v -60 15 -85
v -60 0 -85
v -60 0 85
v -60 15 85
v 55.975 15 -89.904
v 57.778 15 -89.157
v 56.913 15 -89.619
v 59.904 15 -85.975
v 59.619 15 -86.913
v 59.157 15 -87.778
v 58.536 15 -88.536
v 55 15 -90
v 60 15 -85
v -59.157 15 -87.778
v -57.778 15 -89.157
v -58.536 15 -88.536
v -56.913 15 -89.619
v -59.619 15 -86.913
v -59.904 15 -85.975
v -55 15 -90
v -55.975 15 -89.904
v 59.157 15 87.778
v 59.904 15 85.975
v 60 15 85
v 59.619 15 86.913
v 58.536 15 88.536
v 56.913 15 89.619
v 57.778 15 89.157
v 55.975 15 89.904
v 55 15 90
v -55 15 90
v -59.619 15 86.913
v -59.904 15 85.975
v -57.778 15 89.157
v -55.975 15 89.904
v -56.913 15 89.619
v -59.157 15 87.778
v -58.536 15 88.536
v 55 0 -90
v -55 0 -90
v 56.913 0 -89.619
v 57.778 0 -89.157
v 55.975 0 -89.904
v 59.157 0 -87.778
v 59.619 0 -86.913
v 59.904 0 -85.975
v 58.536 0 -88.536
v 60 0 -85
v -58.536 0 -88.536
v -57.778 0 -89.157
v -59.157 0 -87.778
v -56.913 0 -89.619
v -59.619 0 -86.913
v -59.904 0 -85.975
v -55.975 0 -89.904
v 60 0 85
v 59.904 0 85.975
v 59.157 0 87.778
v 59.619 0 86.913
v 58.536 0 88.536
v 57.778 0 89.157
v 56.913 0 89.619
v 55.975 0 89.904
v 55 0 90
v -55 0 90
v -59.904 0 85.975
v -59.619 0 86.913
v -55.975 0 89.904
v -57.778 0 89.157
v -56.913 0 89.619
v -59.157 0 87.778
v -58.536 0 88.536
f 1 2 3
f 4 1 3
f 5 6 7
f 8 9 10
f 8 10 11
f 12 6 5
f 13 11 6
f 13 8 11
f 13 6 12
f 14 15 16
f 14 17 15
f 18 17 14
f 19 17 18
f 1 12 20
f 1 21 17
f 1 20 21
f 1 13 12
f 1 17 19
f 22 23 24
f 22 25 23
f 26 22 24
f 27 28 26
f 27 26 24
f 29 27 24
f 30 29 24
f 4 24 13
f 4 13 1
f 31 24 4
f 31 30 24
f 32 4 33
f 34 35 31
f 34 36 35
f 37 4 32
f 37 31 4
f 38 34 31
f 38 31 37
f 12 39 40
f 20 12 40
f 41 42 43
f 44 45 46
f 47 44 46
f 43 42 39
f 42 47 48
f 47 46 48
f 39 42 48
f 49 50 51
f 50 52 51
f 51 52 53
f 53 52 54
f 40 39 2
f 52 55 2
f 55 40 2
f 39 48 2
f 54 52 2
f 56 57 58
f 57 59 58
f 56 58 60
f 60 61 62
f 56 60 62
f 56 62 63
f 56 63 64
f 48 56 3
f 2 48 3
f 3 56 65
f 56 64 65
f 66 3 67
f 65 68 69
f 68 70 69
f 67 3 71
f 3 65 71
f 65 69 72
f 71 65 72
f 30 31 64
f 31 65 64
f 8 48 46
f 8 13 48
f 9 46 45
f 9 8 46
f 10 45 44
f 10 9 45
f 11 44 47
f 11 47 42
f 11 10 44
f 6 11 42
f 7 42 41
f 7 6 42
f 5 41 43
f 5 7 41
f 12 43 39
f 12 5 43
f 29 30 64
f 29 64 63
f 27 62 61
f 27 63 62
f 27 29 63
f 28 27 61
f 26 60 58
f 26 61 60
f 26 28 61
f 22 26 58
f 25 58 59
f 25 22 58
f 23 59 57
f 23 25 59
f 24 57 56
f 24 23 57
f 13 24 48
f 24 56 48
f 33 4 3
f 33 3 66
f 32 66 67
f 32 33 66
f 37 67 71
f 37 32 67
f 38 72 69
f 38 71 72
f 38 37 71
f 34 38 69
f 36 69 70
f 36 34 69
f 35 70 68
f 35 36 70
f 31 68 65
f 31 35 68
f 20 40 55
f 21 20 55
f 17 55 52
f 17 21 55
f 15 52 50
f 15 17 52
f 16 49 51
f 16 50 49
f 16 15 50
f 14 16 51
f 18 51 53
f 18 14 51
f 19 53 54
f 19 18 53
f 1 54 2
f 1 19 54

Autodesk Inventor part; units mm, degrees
ref_plane "YZ Plane" through (0, 0, 0) normal (1, 0, 0) x (0, 1, 0)
ref_plane "XZ Plane" through (0, 0, 0) normal (0, 1, 0) x (-1, 0, 0)
ref_plane "XY Plane" through (0, 0, 0) normal (0, 0, 1) x (1, 0, 0)
sketch "Sketch1" plane through (0, 0, 0) normal (0, 1, 0) x (-1, 0, 0)
  line L0 (60, 90) -> (-60, 90)
  line L1 (-60, 90) -> (-60, -90)
  line L2 (-60, -90) -> (60, -90)
  line L3 (60, -90) -> (60, 90)
  line L4 (60, 90) -> (-60, -90) construction
  line L5 (-60, 90) -> (60, -90) construction
  point P0 (0, 0)
  dimension "d0" = 120
  dimension "d1" = 180
extrude "Extrusion1" add sketch "Sketch1" along normal blind 15
fillet "Face Fillet1" radius 5 1 edges at (60, 7.5, 90)
fillet "Face Fillet2" radius 5 1 edges at (60, 7.5, -90)
fillet "Face Fillet3" radius 5 1 edges at (-60, 7.5, 90)
fillet "Face Fillet4" radius 5 1 edges at (-60, 7.5, -90)
properties part number "wheel_part"
